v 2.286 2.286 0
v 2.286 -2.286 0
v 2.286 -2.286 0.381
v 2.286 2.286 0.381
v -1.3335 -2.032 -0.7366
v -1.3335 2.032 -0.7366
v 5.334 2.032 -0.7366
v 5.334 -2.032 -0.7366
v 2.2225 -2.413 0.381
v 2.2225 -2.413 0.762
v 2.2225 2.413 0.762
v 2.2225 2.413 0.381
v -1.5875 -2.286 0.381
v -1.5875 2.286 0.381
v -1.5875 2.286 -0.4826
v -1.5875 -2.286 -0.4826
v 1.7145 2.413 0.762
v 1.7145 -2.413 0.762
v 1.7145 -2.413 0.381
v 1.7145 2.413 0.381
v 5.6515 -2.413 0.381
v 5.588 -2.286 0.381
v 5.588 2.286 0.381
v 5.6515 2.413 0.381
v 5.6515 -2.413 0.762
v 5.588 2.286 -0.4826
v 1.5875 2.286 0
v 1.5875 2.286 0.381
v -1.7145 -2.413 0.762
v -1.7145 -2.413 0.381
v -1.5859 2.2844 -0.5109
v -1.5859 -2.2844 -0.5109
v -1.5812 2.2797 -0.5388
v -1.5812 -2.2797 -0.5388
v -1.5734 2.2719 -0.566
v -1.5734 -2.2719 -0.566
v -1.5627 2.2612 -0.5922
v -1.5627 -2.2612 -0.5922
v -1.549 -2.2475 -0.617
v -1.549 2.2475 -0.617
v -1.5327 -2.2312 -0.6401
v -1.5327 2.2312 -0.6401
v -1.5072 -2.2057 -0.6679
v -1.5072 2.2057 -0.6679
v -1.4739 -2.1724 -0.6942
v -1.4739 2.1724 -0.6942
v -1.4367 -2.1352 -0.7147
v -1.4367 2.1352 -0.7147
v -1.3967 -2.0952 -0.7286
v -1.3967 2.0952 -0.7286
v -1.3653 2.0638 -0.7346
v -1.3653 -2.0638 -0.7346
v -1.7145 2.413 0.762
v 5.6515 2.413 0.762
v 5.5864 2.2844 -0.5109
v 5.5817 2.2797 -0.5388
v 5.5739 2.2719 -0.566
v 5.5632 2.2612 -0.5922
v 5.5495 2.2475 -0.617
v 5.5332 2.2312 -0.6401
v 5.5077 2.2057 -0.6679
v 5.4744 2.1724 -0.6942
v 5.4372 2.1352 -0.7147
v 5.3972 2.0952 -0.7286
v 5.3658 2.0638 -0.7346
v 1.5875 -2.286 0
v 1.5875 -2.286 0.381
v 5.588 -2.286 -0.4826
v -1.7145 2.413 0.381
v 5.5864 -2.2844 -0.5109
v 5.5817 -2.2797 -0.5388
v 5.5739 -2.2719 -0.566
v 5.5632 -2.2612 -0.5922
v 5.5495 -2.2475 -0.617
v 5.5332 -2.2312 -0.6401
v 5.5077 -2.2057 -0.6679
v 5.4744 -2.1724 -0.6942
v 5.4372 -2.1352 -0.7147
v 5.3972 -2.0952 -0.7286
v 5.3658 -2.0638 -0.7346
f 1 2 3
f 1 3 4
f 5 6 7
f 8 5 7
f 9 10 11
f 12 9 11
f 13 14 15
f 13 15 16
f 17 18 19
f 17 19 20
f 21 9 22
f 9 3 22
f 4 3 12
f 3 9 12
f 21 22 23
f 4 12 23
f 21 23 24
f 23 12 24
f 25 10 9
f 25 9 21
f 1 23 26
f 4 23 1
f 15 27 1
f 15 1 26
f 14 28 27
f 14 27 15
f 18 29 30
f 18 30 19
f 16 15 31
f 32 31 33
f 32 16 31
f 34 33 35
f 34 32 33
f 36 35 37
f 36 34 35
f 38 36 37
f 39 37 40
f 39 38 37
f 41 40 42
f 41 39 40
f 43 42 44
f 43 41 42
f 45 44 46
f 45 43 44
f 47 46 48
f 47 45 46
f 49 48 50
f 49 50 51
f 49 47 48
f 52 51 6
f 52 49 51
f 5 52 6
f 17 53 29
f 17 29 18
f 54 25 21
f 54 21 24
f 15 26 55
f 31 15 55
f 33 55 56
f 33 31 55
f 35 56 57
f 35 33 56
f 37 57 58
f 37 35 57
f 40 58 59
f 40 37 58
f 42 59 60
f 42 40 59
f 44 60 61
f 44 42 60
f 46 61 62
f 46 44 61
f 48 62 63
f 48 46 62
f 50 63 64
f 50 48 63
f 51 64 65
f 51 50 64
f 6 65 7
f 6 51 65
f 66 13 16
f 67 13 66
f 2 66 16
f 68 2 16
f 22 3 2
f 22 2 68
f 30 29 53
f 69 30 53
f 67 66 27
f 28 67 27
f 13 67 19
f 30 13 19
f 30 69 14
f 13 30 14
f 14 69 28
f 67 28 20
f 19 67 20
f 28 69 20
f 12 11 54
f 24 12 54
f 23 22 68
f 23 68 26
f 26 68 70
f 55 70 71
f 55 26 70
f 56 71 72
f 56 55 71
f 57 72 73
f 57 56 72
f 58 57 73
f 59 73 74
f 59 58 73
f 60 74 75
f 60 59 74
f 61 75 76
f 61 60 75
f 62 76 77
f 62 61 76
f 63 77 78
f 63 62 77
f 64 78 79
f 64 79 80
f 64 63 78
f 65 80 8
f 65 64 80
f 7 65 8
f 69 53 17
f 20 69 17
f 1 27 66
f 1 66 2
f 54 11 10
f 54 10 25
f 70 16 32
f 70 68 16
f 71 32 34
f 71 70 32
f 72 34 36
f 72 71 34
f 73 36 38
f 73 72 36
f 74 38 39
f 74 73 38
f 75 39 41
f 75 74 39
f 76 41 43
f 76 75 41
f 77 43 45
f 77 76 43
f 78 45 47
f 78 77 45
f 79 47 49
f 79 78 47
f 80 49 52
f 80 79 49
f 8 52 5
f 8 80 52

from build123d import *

# Parameters (mm, degrees)
SKETCH2_W             = 3.175
SKETCH2_H             = 4.572
BOSS_EXTRUDE1_DEPTH   = 0.762
SKETCH2_W_2           = 3.302
BOSS_EXTRUDE1_2_DEPTH = 0.762
BOSS_EXTRUDE2_DEPTH   = 0.7366
FILLET1_R             = 0.254
SKETCH4_W             = 3.429
SKETCH4_H             = 4.826
BOSS_EXTRUDE3_DEPTH   = 0.381


with BuildPart() as part:
    # Sketch2 → Boss-Extrude1 (new body)
    with BuildSketch(Plane.XY):
        Rectangle(SKETCH2_W, SKETCH2_H)
    extrude(amount=BOSS_EXTRUDE1_DEPTH)



with BuildPart() as body_2:
    # Sketch2 → Boss-Extrude1 2 (new body)
    with BuildSketch(Plane.XY):
        with Locations((3.937, 0)):
            Rectangle(SKETCH2_W_2, SKETCH2_H)
    extrude(amount=BOSS_EXTRUDE1_2_DEPTH)


with BuildPart() as part_1:
    add(part.part)

    add(body_2.part)  # Boss-Extrude2 merges body 2
    # Sketch3 → Boss-Extrude2 (add)
    with BuildSketch(Plane.XY):
        Polygon((-1.5875, -2.286), (1.5875, -2.286), (2.286, -2.286), (5.588, -2.286), (5.588, 2.286), (2.286, 2.286), (1.5875, 2.286), (-1.5875, 2.286), align=None)
    extrude(amount=-BOSS_EXTRUDE2_DEPTH)

    # Fillet1
    fillet1_edges = [part_1.edges().sort_by_distance(p)[0] for p in [
        (2.00025, 2.286, -0.7366),
        (5.588, 0, -0.7366),
        (2.00025, -2.286, -0.7366),
        (-1.5875, 0, -0.7366),
    ]]
    fillet(fillet1_edges, radius=FILLET1_R)

    # Sketch4 → Boss-Extrude3 (add)
    with BuildSketch(Plane.XY.offset(0.762)):
        Rectangle(SKETCH4_W, SKETCH4_H)
        with Locations((3.937, 0)):
            Rectangle(SKETCH4_W, SKETCH4_H)
    extrude(amount=-BOSS_EXTRUDE3_DEPTH)


solid = part_1.part
